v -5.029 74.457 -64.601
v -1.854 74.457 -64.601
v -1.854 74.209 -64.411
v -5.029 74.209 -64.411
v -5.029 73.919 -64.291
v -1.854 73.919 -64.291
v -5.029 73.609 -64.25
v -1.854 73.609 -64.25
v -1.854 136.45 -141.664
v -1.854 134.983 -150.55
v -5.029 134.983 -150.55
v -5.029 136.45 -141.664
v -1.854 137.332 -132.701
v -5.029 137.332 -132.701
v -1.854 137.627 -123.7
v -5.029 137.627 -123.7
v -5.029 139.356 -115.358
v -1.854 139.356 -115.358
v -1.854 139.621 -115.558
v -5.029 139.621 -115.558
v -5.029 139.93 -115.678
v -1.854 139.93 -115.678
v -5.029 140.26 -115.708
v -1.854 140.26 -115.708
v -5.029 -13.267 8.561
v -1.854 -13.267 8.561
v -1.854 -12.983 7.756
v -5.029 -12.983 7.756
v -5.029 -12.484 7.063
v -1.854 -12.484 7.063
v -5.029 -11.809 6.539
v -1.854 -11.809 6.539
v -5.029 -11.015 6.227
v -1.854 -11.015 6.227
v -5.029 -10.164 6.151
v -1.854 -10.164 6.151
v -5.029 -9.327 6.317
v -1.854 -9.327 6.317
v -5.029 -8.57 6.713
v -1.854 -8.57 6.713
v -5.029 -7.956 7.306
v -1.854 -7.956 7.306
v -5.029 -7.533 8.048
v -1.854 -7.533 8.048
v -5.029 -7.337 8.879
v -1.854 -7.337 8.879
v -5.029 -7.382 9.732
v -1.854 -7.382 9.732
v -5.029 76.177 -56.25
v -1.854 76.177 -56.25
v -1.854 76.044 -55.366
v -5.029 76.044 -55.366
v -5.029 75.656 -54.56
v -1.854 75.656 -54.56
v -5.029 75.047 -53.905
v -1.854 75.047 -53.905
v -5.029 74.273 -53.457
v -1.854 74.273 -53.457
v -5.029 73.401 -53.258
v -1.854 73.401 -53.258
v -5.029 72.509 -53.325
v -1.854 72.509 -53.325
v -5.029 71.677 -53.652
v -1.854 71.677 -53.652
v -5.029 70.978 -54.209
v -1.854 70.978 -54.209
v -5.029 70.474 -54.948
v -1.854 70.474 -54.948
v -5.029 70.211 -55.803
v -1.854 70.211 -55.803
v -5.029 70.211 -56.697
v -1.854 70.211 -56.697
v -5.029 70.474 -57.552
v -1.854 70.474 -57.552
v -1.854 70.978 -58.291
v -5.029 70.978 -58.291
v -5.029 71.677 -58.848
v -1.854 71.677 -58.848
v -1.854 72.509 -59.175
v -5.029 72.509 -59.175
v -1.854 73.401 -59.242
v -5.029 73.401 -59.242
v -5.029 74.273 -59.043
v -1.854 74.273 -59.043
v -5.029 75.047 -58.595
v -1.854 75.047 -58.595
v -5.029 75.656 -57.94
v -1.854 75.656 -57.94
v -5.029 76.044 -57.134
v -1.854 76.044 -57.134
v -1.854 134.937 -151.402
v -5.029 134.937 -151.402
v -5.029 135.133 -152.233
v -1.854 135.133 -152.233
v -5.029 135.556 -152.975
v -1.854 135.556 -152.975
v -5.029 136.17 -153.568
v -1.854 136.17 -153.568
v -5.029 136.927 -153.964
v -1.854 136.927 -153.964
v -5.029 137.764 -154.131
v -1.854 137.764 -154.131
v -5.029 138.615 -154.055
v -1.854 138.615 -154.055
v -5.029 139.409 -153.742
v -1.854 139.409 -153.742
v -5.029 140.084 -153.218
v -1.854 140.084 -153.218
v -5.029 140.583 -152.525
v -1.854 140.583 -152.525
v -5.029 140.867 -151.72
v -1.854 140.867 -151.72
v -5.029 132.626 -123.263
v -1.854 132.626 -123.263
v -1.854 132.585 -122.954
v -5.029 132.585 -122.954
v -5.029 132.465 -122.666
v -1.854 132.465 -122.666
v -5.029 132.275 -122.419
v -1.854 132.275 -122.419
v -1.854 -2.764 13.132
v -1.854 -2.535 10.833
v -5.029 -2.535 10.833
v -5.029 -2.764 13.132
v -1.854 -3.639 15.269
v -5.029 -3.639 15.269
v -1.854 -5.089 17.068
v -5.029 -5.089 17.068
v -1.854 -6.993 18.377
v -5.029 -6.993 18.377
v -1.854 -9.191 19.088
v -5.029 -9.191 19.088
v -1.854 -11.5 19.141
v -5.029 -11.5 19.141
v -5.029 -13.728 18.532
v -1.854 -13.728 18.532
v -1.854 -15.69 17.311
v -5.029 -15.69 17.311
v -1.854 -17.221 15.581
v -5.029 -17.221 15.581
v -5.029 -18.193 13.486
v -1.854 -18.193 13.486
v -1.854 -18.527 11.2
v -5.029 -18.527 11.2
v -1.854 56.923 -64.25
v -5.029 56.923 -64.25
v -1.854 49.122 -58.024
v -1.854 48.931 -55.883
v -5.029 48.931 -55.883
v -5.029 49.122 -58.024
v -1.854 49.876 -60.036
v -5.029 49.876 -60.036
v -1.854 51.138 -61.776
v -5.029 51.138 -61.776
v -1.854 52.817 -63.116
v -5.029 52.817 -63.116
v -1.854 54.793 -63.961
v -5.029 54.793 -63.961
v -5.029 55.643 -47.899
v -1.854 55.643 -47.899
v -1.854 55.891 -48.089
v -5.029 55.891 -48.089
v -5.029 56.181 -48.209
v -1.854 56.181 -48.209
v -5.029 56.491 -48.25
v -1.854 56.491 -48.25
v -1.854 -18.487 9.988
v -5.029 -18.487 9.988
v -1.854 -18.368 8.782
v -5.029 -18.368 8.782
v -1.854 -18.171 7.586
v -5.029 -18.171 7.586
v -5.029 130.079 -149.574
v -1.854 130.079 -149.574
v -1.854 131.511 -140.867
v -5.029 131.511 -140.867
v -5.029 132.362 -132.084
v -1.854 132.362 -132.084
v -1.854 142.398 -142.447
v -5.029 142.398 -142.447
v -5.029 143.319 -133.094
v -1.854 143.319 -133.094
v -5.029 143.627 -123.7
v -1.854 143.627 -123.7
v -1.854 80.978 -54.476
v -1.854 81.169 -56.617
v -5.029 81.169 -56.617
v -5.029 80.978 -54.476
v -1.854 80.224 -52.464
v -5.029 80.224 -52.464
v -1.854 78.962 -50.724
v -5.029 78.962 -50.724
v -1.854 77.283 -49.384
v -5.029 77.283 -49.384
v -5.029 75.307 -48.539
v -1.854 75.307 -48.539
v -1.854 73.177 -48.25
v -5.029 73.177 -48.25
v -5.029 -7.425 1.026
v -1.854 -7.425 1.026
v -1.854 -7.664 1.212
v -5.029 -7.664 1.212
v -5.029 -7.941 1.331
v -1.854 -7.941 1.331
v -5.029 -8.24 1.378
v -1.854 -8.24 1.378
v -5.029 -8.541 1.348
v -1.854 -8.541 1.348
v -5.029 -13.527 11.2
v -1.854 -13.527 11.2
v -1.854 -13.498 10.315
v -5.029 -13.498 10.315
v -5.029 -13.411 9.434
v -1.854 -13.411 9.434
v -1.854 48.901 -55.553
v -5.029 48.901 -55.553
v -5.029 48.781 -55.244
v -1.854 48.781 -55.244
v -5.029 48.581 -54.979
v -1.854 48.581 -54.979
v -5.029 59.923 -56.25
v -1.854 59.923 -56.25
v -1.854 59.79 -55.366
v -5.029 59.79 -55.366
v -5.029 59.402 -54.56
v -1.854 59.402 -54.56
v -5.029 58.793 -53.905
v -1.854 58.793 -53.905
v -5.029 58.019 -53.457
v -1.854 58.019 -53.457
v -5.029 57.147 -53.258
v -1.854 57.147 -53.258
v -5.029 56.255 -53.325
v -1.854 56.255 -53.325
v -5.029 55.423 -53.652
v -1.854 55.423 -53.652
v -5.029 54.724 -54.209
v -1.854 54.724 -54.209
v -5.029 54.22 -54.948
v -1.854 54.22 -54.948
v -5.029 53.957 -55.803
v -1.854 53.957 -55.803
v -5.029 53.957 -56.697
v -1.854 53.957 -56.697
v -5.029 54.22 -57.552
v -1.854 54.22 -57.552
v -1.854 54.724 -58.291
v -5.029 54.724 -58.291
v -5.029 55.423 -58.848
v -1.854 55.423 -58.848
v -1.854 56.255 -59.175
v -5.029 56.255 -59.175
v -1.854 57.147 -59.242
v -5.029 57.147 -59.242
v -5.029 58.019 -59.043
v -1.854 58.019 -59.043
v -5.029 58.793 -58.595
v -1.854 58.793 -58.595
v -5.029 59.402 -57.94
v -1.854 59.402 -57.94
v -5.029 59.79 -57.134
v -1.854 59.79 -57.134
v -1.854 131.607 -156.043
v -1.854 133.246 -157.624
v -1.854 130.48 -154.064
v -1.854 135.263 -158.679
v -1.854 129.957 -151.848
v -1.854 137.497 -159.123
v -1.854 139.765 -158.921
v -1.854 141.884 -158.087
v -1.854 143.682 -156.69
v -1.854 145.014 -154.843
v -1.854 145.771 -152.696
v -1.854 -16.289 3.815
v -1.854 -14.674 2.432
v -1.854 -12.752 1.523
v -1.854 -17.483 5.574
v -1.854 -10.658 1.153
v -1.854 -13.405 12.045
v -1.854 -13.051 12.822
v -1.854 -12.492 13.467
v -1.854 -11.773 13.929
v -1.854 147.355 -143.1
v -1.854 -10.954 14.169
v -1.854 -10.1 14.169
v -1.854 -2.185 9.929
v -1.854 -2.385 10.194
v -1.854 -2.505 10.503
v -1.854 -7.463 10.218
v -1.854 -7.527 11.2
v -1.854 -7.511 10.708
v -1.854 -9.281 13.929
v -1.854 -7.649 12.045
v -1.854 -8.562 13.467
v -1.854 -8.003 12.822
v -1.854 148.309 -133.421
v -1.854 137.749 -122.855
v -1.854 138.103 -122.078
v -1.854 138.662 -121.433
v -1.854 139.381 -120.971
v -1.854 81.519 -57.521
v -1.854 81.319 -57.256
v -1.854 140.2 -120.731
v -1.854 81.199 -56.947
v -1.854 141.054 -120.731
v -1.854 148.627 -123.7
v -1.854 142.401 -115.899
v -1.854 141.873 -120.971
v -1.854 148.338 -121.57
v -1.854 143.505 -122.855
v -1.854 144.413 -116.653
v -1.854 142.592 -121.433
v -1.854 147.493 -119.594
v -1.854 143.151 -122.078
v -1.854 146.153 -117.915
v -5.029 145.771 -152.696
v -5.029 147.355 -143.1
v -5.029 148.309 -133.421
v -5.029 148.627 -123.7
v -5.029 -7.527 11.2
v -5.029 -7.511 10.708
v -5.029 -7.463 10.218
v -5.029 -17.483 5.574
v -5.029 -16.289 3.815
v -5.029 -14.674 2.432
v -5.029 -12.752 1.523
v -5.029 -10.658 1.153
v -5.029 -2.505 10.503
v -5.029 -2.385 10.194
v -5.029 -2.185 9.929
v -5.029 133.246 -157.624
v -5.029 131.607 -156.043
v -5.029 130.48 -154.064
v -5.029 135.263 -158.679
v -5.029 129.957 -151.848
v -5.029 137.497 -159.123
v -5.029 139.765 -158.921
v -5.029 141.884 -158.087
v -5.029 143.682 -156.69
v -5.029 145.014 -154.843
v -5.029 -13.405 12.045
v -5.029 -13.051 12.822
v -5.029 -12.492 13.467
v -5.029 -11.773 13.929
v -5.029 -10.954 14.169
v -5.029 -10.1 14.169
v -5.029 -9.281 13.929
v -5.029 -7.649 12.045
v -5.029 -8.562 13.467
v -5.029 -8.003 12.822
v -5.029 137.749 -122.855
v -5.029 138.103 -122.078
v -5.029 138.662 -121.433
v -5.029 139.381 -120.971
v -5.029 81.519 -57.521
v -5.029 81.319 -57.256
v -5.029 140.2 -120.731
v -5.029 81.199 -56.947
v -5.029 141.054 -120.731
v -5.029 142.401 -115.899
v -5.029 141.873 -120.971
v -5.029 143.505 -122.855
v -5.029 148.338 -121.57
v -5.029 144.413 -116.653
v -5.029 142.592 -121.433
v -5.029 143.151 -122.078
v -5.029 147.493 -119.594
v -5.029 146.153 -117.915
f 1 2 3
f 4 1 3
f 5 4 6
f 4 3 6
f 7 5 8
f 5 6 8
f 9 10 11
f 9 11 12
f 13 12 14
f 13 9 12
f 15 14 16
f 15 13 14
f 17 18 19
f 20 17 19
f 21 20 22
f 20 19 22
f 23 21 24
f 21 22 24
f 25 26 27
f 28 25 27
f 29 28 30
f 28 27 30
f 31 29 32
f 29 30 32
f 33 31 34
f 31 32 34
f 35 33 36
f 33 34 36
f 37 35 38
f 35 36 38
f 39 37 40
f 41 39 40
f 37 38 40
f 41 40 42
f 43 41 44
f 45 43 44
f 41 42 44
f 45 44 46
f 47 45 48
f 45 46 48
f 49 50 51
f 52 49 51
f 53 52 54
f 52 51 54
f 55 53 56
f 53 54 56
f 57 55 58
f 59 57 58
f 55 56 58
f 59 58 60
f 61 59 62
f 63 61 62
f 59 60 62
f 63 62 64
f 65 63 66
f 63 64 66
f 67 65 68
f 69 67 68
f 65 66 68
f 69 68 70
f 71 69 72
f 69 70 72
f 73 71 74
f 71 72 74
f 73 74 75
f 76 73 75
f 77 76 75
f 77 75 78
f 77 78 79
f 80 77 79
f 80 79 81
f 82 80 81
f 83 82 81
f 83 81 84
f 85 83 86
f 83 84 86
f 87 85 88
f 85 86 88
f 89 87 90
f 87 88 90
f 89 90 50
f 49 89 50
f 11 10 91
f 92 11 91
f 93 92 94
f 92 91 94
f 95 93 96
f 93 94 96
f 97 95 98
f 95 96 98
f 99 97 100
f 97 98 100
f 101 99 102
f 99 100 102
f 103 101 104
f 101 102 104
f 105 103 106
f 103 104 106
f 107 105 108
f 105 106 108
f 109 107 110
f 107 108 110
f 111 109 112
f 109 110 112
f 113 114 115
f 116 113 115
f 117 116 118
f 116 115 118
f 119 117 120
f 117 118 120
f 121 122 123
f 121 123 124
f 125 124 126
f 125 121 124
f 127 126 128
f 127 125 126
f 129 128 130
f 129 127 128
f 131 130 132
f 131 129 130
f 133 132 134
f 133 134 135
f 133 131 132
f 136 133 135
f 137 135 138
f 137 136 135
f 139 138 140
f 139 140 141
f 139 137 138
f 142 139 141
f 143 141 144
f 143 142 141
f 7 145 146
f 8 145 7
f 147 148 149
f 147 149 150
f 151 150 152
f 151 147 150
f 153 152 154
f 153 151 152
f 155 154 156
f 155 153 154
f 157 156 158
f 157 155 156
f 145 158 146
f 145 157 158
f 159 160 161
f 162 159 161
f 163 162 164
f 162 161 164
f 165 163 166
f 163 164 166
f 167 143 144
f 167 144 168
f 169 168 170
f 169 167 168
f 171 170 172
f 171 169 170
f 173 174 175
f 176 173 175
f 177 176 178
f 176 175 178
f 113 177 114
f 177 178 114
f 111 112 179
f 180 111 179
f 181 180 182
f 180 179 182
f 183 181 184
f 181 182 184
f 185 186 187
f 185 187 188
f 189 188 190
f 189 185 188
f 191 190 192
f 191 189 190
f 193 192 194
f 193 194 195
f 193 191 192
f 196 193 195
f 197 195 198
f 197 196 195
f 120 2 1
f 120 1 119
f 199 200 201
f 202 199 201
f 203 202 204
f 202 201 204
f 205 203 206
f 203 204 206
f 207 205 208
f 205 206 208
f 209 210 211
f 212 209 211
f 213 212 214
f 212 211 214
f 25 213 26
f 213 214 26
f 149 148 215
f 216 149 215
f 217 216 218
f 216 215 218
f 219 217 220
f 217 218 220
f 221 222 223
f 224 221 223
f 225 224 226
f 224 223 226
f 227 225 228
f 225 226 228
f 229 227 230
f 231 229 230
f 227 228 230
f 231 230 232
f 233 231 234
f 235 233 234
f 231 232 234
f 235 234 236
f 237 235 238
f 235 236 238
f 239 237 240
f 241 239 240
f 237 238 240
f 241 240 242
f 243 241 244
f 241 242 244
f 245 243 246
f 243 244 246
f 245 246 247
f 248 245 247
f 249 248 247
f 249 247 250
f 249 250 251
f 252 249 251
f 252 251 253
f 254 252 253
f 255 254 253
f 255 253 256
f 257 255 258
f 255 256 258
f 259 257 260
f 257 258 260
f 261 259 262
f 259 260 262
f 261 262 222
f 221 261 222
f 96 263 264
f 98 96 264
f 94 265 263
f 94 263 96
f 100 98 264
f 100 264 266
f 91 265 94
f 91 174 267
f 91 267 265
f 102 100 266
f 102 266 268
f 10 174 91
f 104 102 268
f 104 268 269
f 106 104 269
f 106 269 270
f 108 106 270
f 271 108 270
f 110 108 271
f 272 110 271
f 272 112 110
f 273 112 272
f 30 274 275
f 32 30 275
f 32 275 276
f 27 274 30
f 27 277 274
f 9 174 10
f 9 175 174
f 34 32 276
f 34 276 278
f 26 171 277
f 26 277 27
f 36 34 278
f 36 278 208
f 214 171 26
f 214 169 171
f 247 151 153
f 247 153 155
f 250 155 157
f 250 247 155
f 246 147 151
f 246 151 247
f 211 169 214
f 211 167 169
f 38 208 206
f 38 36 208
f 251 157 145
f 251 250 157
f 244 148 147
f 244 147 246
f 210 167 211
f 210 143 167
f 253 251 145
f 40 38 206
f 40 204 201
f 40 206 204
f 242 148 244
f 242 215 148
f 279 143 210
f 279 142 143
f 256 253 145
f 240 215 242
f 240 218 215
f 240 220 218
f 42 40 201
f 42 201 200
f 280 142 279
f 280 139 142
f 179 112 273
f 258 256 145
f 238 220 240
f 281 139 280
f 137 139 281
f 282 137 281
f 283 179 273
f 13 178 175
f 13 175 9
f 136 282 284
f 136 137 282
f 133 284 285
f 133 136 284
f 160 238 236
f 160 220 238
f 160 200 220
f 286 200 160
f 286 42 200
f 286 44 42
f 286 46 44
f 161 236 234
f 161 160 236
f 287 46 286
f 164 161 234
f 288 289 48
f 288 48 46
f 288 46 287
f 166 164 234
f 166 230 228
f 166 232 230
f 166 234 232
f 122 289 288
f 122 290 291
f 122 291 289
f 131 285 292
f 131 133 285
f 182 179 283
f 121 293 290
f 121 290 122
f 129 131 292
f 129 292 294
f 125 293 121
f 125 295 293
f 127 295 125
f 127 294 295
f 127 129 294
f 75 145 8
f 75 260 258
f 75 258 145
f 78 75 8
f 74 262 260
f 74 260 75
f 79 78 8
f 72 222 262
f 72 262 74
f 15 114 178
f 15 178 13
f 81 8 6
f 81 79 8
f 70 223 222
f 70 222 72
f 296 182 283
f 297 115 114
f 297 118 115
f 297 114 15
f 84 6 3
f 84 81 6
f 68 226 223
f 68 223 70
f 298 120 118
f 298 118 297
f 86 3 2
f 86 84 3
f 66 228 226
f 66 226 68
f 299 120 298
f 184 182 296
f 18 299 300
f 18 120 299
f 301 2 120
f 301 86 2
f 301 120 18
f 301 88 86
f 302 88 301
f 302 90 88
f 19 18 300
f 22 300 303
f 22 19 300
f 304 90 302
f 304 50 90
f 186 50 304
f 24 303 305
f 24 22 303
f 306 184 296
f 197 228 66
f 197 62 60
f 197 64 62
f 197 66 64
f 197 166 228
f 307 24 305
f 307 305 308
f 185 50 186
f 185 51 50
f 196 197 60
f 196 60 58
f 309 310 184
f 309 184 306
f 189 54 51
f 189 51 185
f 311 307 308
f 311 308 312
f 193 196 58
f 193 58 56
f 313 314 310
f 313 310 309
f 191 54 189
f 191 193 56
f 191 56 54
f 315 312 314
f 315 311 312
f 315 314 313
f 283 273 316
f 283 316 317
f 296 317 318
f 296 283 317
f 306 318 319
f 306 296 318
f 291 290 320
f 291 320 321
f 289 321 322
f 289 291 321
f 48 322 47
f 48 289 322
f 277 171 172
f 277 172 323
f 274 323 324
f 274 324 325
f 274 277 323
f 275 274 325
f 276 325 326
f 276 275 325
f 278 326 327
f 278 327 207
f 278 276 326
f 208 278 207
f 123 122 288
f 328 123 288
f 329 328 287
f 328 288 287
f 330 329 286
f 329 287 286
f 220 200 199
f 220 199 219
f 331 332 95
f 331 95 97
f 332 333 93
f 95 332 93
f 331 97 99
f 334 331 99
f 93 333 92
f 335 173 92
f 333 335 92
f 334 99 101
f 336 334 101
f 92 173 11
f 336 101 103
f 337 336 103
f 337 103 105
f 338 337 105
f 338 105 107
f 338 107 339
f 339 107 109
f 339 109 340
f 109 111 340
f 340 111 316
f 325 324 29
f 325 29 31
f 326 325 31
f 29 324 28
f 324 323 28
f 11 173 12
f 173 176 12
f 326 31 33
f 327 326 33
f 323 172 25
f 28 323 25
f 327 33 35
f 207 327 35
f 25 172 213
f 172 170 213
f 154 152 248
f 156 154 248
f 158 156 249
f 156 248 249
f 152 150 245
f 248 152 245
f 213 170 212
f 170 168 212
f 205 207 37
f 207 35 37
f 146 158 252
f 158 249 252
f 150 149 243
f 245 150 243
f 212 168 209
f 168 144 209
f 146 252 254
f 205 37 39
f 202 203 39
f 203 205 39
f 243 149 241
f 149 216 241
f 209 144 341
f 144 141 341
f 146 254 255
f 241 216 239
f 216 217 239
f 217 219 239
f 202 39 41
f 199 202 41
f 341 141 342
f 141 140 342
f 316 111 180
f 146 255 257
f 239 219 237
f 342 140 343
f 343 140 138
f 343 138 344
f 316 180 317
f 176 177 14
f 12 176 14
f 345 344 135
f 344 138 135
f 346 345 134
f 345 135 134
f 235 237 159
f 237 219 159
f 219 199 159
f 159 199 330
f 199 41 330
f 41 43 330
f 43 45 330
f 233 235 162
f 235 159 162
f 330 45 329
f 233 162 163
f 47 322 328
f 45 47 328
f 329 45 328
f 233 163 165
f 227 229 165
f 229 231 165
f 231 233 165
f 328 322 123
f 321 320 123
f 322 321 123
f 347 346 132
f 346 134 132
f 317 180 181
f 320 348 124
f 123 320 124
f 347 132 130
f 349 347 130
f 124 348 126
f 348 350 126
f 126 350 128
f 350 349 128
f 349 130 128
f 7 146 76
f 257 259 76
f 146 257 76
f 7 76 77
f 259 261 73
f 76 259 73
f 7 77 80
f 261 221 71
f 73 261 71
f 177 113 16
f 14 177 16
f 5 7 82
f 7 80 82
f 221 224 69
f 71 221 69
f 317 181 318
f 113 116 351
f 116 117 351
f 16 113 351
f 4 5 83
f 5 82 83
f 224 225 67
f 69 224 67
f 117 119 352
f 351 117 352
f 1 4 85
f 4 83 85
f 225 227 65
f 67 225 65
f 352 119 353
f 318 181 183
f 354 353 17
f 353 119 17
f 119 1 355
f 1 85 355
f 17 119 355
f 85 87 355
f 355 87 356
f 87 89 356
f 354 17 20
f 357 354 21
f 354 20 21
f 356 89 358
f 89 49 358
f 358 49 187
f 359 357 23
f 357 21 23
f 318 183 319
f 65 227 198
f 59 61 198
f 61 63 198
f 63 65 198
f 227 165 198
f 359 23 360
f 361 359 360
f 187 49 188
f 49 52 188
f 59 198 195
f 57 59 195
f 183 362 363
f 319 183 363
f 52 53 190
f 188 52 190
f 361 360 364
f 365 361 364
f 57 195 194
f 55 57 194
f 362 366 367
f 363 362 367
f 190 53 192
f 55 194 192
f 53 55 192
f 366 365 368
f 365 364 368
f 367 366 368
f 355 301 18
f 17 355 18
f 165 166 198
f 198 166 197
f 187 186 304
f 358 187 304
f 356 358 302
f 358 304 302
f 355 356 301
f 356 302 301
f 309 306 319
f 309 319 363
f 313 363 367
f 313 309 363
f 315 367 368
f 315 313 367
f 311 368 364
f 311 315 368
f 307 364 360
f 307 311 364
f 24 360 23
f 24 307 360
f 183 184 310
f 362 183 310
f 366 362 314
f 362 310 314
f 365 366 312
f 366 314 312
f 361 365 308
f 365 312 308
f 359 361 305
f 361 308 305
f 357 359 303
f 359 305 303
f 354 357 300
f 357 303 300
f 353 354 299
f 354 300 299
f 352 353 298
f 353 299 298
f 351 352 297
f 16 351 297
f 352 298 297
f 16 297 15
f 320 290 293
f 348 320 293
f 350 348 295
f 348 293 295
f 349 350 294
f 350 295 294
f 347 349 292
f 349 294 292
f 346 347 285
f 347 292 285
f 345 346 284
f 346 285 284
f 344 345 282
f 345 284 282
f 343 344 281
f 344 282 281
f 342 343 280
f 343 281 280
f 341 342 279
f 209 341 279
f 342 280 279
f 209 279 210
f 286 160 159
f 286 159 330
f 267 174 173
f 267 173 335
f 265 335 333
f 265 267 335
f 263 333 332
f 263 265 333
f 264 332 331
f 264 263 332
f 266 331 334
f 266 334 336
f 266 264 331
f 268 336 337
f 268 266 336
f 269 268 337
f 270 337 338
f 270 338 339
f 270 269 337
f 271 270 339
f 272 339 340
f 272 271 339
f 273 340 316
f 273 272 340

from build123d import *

# Parameters (mm, degrees)
SKETCH_R  = 3
PAD_DEPTH = 3.175


with BuildPart() as part:
    # Sketch (on Face26 of Binder) → Pad (new body)
    with BuildSketch(Plane.YZ.offset(-1.8542)):
        with BuildLine():
            ThreePointArc((48.931428, -55.882884), (51.137806, -61.775535), (56.923, -64.25))
            Line((56.923, -64.25), (73.608876, -64.25))
            ThreePointArc((74.457404, -64.601472), (74.068096, -64.341345), (73.608876, -64.25))
            Line((74.457404, -64.601472), (132.274816, -122.418884))
            ThreePointArc((132.626282, -123.263462), (132.534186, -122.806368), (132.274816, -122.418884))
            ThreePointArc((130.078609, -149.574244), (132.00958, -136.482484), (132.626282, -123.263462))
            ThreePointArc((130.078609, -149.574244), (136.364169, -158.981249), (145.771174, -152.695689))
            ThreePointArc((145.771174, -152.695689), (147.91132, -138.267994), (148.627, -123.7))
            ThreePointArc((148.627, -123.7), (146.152535, -117.914806), (140.259884, -115.708428))
            ThreePointArc((139.356288, -115.35822), (139.771162, -115.628595), (140.259884, -115.708428))
            Line((81.51878, -57.520712), (139.356288, -115.35822))
            ThreePointArc((81.168572, -56.617116), (81.248405, -57.105838), (81.51878, -57.520712))
            ThreePointArc((81.168572, -56.617116), (78.962194, -50.724465), (73.177, -48.25))
            Line((56.491124, -48.25), (73.177, -48.25))
            ThreePointArc((55.642596, -47.898528), (56.031904, -48.158655), (56.491124, -48.25))
            Line((55.642596, -47.898528), (-2.18522, 9.929288))
            ThreePointArc((-2.535428, 10.832884), (-2.455595, 10.344162), (-2.18522, 9.929288))
            ThreePointArc((-2.535428, 10.832884), (-10.343393, 19.197893), (-18.527, 11.2))
            ThreePointArc((-18.527, 11.2), (-18.437787, 9.384036), (-18.171009, 7.585562))
            ThreePointArc((-18.171009, 7.585562), (-14.673899, 2.43177), (-8.540693, 1.347744))
            ThreePointArc((-7.424559, 1.026492), (-7.941171, 1.331147), (-8.540693, 1.347744))
            Line((-7.424559, 1.026492), (48.58122, -54.979288))
            ThreePointArc((48.931428, -55.882884), (48.851595, -55.394162), (48.58122, -54.979288))
        make_face()
        with Locations((56.923, -56.25)):
            Circle(SKETCH_R, mode=Mode.SUBTRACT)
        with Locations((73.177, -56.25)):
            Circle(SKETCH_R, mode=Mode.SUBTRACT)
        with BuildLine():
            ThreePointArc((-13.527, 11.2), (-13.461864, 9.874122), (-13.267082, 8.561013))
            ThreePointArc((-13.267082, 8.561013), (-9.739456, 6.203928), (-7.382371, 9.731555))
            ThreePointArc((-7.527, 11.2), (-7.490755, 10.462225), (-7.382371, 9.731555))
            ThreePointArc((-7.527, 11.2), (-10.527, 14.2), (-13.527, 11.2))
        make_face(mode=Mode.SUBTRACT)
        with BuildLine():
            ThreePointArc((140.867247, -151.720238), (142.935397, -137.777908), (143.627, -123.7))
            ThreePointArc((143.627, -123.7), (140.627, -120.7), (137.627, -123.7))
            ThreePointArc((134.982536, -150.549696), (136.964288, -137.189805), (137.627, -123.7))
            ThreePointArc((134.982536, -150.549696), (137.339621, -154.077323), (140.867247, -151.720238))
        make_face(mode=Mode.SUBTRACT)
    extrude(amount=-PAD_DEPTH)


solid = part.part
